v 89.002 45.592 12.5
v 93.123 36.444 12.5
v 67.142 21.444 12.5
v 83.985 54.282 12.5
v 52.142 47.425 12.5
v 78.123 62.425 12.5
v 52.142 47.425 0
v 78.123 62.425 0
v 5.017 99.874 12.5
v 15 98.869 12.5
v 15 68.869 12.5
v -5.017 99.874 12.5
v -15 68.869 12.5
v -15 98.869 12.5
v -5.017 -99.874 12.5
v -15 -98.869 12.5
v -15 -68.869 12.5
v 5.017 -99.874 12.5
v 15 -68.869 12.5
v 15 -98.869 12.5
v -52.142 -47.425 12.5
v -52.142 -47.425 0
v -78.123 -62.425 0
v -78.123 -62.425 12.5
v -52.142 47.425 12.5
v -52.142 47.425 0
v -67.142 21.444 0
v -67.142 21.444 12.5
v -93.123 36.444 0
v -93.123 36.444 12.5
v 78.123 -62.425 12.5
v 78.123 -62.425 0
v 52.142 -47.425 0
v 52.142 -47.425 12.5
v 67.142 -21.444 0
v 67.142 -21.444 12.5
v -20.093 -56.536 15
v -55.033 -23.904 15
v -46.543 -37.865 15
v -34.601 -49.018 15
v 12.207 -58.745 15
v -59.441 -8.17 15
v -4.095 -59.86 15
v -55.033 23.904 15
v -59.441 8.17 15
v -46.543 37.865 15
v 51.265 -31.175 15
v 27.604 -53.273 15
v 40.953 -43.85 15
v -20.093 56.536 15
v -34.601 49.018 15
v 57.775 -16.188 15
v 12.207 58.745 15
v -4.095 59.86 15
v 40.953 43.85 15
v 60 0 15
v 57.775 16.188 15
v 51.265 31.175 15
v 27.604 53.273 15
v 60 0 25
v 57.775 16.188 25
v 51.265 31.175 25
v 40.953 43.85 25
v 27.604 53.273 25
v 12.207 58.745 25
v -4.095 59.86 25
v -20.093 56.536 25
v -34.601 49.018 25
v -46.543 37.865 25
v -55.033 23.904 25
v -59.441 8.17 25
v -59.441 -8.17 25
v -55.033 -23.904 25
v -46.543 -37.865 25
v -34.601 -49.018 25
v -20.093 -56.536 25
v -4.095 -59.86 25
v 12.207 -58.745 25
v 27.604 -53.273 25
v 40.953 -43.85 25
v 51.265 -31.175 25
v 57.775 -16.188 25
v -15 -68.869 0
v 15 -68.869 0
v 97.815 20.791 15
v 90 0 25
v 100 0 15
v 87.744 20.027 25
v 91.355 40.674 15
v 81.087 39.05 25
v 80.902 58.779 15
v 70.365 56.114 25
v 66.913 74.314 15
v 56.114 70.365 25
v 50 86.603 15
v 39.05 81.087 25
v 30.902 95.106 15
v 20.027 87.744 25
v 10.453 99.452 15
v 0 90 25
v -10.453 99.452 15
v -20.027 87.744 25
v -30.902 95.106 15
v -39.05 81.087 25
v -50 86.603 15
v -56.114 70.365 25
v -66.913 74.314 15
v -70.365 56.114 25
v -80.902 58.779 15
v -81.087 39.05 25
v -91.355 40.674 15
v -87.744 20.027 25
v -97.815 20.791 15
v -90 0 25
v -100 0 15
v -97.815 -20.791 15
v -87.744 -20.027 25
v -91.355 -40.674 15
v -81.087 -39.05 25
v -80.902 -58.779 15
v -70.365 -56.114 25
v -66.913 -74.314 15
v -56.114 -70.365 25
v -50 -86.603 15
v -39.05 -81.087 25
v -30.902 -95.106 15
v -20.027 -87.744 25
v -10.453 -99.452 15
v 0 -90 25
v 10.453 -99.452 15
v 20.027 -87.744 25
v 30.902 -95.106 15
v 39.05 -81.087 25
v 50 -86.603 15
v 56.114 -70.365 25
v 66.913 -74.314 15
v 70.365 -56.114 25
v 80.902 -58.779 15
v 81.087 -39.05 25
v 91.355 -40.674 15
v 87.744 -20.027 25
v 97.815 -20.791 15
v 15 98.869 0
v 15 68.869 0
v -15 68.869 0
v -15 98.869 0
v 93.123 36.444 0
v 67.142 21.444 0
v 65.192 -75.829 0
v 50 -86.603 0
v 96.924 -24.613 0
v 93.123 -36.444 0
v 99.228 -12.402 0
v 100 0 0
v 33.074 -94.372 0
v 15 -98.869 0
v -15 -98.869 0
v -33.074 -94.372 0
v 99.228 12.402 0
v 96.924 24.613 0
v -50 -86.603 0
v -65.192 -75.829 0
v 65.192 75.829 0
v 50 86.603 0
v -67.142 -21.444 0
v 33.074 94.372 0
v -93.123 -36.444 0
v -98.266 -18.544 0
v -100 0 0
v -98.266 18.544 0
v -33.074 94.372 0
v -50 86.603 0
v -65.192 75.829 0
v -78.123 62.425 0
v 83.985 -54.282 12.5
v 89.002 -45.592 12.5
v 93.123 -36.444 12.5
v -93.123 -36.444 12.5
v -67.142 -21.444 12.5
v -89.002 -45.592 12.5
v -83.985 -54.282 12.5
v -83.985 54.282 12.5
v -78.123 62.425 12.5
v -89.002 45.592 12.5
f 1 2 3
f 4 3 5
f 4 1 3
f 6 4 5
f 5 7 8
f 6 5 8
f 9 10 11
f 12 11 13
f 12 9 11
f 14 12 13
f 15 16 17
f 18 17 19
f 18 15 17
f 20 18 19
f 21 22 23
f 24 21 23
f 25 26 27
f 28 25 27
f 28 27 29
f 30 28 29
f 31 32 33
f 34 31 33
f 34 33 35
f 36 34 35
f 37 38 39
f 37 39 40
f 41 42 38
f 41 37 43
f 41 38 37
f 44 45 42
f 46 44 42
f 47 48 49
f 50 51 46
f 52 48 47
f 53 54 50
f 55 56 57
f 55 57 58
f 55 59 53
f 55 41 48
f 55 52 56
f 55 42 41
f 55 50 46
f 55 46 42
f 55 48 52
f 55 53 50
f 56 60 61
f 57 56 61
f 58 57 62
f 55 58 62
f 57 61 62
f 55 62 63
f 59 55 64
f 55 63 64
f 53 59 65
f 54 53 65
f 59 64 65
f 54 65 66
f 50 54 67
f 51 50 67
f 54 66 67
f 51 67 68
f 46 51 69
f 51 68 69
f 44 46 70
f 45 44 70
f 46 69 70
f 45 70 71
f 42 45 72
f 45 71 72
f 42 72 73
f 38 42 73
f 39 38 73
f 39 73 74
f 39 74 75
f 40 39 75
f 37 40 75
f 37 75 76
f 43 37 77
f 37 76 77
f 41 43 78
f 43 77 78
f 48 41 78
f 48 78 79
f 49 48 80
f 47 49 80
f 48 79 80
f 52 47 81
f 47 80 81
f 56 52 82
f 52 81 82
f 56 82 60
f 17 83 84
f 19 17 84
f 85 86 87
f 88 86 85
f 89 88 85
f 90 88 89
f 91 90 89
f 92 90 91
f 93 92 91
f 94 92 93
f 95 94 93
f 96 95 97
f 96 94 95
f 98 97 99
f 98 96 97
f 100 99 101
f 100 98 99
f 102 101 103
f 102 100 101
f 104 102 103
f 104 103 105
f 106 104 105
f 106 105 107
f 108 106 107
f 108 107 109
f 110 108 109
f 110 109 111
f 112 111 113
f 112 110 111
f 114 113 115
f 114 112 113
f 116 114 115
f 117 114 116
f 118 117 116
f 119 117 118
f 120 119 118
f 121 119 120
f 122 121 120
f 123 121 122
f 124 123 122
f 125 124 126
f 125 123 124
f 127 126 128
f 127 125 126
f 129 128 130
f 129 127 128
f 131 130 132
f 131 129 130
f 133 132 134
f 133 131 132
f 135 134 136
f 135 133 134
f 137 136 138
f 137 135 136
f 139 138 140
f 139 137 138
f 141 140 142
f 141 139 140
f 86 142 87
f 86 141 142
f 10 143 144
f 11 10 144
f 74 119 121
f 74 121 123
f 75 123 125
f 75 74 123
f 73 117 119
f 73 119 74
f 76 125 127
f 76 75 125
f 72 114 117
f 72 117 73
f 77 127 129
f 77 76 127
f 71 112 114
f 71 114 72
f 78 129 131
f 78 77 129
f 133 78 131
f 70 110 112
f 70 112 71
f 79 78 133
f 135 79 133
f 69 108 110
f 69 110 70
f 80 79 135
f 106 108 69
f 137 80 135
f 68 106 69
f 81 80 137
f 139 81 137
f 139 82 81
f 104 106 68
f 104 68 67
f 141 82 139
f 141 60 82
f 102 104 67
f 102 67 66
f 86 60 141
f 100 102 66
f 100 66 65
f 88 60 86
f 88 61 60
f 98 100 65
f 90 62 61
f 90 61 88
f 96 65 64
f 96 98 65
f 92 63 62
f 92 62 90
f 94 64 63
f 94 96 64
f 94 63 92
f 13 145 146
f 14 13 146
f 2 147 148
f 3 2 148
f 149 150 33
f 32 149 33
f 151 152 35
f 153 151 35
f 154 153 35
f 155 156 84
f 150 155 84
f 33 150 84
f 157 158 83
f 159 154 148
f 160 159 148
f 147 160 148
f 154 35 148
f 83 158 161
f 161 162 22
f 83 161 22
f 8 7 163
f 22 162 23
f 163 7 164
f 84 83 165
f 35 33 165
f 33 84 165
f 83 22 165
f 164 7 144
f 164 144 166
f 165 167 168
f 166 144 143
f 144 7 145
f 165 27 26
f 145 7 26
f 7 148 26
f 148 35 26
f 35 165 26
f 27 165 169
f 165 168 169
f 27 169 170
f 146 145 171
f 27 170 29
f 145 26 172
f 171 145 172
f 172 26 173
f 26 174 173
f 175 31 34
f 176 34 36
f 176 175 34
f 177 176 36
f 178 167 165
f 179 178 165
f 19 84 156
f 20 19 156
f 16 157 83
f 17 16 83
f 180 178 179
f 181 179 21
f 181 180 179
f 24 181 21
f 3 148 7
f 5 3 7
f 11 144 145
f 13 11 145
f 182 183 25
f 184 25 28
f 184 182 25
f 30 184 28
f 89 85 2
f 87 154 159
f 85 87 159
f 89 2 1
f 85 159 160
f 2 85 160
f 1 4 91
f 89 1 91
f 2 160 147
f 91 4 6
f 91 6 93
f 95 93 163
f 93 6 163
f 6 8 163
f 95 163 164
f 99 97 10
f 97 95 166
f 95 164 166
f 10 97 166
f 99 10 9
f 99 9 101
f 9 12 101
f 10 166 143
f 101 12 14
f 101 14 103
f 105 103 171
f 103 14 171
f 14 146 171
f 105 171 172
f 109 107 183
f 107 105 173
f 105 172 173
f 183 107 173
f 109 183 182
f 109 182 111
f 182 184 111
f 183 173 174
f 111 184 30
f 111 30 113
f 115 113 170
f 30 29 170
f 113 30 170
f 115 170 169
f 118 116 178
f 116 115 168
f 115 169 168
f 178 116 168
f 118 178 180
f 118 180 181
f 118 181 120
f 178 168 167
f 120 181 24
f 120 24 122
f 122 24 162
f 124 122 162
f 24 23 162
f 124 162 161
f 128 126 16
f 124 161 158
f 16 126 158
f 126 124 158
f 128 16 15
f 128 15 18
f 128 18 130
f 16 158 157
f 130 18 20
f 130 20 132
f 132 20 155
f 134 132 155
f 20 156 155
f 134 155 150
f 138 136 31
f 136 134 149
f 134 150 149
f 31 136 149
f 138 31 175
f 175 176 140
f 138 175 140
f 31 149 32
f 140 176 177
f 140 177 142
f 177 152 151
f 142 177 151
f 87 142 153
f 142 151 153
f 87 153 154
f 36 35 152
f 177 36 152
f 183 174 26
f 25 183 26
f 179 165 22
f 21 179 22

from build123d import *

# Parameters (mm, degrees)
SKETCH1_R           = 100
SKETCH1_R_2         = 60
BOSS_EXTRUDE1_DEPTH = 25
CUT_EXTRUDE1_START  = 25
SKETCH1_3_R         = 60
CUT_EXTRUDE1_DEPTH  = 10
CHAMFER1_SIZE       = 10
CUT_EXTRUDE2_DEPTH  = 12.5
CIRPATTERN1_COUNT   = 6


with BuildPart() as part:
    # Sketch1 → Boss-Extrude1 (new body)
    # profile 1 of 2: a face of its own
    with BuildSketch(Plane(origin=(0, 0, 0), x_dir=(0, 1, 0), z_dir=(0, 0, 1))):
        with Locations(Location((0, 0, 0), (0, 0, 270))):
            Circle(SKETCH1_R)
        Circle(SKETCH1_R_2, mode=Mode.SUBTRACT)
    # profile 2 of 2: a face of its own
    with BuildSketch(Plane(origin=(0, 0, 0), x_dir=(0, 1, 0), z_dir=(0, 0, 1))):
        Circle(SKETCH1_R_2)
    extrude(amount=BOSS_EXTRUDE1_DEPTH)

    # Sketch1<3> → Cut-Extrude1 (cut)
    with BuildSketch(Plane(origin=(0, 0, 0), x_dir=(0, 1, 0), z_dir=(0, 0, 1)).offset(CUT_EXTRUDE1_START)):
        with Locations(Location((0, 0, 0), (0, 0, 270))):
            Circle(SKETCH1_3_R)
    extrude(amount=-CUT_EXTRUDE1_DEPTH, mode=Mode.SUBTRACT)

    # Chamfer1
    chamfer1_edges = [part.edges().sort_by_distance(p)[0] for p in [
        (-100, 0, 25),
    ]]
    chamfer(chamfer1_edges, length=CHAMFER1_SIZE)

    # Sketch3 → Cut-Extrude2 (cut)
    with BuildSketch(Plane(origin=(0, 0, 0), x_dir=(1, 0, 0), z_dir=(0, 0, -1))):
        with BuildLine():
            Line((-15, 98.868599666), (-15, 68.868599666))
            Line((-15, 68.868599666), (15, 68.868599666))
            Line((15, 68.868599666), (15, 98.868599666))
            ThreePointArc((15, 98.868599666), (0, 100), (-15, 98.868599666))
        make_face()
    cut_extrude2 = extrude(amount=-CUT_EXTRUDE2_DEPTH, mode=Mode.SUBTRACT)

    # CirPattern1: Cut-Extrude2 ×6 about axis
    cirpattern1_axis = Axis((0, 0, 0), (0, 0, 1))
    for i in range(1, CIRPATTERN1_COUNT):
        add(cut_extrude2.rotate(cirpattern1_axis, i * 360 / CIRPATTERN1_COUNT), mode=Mode.SUBTRACT)


solid = part.part
